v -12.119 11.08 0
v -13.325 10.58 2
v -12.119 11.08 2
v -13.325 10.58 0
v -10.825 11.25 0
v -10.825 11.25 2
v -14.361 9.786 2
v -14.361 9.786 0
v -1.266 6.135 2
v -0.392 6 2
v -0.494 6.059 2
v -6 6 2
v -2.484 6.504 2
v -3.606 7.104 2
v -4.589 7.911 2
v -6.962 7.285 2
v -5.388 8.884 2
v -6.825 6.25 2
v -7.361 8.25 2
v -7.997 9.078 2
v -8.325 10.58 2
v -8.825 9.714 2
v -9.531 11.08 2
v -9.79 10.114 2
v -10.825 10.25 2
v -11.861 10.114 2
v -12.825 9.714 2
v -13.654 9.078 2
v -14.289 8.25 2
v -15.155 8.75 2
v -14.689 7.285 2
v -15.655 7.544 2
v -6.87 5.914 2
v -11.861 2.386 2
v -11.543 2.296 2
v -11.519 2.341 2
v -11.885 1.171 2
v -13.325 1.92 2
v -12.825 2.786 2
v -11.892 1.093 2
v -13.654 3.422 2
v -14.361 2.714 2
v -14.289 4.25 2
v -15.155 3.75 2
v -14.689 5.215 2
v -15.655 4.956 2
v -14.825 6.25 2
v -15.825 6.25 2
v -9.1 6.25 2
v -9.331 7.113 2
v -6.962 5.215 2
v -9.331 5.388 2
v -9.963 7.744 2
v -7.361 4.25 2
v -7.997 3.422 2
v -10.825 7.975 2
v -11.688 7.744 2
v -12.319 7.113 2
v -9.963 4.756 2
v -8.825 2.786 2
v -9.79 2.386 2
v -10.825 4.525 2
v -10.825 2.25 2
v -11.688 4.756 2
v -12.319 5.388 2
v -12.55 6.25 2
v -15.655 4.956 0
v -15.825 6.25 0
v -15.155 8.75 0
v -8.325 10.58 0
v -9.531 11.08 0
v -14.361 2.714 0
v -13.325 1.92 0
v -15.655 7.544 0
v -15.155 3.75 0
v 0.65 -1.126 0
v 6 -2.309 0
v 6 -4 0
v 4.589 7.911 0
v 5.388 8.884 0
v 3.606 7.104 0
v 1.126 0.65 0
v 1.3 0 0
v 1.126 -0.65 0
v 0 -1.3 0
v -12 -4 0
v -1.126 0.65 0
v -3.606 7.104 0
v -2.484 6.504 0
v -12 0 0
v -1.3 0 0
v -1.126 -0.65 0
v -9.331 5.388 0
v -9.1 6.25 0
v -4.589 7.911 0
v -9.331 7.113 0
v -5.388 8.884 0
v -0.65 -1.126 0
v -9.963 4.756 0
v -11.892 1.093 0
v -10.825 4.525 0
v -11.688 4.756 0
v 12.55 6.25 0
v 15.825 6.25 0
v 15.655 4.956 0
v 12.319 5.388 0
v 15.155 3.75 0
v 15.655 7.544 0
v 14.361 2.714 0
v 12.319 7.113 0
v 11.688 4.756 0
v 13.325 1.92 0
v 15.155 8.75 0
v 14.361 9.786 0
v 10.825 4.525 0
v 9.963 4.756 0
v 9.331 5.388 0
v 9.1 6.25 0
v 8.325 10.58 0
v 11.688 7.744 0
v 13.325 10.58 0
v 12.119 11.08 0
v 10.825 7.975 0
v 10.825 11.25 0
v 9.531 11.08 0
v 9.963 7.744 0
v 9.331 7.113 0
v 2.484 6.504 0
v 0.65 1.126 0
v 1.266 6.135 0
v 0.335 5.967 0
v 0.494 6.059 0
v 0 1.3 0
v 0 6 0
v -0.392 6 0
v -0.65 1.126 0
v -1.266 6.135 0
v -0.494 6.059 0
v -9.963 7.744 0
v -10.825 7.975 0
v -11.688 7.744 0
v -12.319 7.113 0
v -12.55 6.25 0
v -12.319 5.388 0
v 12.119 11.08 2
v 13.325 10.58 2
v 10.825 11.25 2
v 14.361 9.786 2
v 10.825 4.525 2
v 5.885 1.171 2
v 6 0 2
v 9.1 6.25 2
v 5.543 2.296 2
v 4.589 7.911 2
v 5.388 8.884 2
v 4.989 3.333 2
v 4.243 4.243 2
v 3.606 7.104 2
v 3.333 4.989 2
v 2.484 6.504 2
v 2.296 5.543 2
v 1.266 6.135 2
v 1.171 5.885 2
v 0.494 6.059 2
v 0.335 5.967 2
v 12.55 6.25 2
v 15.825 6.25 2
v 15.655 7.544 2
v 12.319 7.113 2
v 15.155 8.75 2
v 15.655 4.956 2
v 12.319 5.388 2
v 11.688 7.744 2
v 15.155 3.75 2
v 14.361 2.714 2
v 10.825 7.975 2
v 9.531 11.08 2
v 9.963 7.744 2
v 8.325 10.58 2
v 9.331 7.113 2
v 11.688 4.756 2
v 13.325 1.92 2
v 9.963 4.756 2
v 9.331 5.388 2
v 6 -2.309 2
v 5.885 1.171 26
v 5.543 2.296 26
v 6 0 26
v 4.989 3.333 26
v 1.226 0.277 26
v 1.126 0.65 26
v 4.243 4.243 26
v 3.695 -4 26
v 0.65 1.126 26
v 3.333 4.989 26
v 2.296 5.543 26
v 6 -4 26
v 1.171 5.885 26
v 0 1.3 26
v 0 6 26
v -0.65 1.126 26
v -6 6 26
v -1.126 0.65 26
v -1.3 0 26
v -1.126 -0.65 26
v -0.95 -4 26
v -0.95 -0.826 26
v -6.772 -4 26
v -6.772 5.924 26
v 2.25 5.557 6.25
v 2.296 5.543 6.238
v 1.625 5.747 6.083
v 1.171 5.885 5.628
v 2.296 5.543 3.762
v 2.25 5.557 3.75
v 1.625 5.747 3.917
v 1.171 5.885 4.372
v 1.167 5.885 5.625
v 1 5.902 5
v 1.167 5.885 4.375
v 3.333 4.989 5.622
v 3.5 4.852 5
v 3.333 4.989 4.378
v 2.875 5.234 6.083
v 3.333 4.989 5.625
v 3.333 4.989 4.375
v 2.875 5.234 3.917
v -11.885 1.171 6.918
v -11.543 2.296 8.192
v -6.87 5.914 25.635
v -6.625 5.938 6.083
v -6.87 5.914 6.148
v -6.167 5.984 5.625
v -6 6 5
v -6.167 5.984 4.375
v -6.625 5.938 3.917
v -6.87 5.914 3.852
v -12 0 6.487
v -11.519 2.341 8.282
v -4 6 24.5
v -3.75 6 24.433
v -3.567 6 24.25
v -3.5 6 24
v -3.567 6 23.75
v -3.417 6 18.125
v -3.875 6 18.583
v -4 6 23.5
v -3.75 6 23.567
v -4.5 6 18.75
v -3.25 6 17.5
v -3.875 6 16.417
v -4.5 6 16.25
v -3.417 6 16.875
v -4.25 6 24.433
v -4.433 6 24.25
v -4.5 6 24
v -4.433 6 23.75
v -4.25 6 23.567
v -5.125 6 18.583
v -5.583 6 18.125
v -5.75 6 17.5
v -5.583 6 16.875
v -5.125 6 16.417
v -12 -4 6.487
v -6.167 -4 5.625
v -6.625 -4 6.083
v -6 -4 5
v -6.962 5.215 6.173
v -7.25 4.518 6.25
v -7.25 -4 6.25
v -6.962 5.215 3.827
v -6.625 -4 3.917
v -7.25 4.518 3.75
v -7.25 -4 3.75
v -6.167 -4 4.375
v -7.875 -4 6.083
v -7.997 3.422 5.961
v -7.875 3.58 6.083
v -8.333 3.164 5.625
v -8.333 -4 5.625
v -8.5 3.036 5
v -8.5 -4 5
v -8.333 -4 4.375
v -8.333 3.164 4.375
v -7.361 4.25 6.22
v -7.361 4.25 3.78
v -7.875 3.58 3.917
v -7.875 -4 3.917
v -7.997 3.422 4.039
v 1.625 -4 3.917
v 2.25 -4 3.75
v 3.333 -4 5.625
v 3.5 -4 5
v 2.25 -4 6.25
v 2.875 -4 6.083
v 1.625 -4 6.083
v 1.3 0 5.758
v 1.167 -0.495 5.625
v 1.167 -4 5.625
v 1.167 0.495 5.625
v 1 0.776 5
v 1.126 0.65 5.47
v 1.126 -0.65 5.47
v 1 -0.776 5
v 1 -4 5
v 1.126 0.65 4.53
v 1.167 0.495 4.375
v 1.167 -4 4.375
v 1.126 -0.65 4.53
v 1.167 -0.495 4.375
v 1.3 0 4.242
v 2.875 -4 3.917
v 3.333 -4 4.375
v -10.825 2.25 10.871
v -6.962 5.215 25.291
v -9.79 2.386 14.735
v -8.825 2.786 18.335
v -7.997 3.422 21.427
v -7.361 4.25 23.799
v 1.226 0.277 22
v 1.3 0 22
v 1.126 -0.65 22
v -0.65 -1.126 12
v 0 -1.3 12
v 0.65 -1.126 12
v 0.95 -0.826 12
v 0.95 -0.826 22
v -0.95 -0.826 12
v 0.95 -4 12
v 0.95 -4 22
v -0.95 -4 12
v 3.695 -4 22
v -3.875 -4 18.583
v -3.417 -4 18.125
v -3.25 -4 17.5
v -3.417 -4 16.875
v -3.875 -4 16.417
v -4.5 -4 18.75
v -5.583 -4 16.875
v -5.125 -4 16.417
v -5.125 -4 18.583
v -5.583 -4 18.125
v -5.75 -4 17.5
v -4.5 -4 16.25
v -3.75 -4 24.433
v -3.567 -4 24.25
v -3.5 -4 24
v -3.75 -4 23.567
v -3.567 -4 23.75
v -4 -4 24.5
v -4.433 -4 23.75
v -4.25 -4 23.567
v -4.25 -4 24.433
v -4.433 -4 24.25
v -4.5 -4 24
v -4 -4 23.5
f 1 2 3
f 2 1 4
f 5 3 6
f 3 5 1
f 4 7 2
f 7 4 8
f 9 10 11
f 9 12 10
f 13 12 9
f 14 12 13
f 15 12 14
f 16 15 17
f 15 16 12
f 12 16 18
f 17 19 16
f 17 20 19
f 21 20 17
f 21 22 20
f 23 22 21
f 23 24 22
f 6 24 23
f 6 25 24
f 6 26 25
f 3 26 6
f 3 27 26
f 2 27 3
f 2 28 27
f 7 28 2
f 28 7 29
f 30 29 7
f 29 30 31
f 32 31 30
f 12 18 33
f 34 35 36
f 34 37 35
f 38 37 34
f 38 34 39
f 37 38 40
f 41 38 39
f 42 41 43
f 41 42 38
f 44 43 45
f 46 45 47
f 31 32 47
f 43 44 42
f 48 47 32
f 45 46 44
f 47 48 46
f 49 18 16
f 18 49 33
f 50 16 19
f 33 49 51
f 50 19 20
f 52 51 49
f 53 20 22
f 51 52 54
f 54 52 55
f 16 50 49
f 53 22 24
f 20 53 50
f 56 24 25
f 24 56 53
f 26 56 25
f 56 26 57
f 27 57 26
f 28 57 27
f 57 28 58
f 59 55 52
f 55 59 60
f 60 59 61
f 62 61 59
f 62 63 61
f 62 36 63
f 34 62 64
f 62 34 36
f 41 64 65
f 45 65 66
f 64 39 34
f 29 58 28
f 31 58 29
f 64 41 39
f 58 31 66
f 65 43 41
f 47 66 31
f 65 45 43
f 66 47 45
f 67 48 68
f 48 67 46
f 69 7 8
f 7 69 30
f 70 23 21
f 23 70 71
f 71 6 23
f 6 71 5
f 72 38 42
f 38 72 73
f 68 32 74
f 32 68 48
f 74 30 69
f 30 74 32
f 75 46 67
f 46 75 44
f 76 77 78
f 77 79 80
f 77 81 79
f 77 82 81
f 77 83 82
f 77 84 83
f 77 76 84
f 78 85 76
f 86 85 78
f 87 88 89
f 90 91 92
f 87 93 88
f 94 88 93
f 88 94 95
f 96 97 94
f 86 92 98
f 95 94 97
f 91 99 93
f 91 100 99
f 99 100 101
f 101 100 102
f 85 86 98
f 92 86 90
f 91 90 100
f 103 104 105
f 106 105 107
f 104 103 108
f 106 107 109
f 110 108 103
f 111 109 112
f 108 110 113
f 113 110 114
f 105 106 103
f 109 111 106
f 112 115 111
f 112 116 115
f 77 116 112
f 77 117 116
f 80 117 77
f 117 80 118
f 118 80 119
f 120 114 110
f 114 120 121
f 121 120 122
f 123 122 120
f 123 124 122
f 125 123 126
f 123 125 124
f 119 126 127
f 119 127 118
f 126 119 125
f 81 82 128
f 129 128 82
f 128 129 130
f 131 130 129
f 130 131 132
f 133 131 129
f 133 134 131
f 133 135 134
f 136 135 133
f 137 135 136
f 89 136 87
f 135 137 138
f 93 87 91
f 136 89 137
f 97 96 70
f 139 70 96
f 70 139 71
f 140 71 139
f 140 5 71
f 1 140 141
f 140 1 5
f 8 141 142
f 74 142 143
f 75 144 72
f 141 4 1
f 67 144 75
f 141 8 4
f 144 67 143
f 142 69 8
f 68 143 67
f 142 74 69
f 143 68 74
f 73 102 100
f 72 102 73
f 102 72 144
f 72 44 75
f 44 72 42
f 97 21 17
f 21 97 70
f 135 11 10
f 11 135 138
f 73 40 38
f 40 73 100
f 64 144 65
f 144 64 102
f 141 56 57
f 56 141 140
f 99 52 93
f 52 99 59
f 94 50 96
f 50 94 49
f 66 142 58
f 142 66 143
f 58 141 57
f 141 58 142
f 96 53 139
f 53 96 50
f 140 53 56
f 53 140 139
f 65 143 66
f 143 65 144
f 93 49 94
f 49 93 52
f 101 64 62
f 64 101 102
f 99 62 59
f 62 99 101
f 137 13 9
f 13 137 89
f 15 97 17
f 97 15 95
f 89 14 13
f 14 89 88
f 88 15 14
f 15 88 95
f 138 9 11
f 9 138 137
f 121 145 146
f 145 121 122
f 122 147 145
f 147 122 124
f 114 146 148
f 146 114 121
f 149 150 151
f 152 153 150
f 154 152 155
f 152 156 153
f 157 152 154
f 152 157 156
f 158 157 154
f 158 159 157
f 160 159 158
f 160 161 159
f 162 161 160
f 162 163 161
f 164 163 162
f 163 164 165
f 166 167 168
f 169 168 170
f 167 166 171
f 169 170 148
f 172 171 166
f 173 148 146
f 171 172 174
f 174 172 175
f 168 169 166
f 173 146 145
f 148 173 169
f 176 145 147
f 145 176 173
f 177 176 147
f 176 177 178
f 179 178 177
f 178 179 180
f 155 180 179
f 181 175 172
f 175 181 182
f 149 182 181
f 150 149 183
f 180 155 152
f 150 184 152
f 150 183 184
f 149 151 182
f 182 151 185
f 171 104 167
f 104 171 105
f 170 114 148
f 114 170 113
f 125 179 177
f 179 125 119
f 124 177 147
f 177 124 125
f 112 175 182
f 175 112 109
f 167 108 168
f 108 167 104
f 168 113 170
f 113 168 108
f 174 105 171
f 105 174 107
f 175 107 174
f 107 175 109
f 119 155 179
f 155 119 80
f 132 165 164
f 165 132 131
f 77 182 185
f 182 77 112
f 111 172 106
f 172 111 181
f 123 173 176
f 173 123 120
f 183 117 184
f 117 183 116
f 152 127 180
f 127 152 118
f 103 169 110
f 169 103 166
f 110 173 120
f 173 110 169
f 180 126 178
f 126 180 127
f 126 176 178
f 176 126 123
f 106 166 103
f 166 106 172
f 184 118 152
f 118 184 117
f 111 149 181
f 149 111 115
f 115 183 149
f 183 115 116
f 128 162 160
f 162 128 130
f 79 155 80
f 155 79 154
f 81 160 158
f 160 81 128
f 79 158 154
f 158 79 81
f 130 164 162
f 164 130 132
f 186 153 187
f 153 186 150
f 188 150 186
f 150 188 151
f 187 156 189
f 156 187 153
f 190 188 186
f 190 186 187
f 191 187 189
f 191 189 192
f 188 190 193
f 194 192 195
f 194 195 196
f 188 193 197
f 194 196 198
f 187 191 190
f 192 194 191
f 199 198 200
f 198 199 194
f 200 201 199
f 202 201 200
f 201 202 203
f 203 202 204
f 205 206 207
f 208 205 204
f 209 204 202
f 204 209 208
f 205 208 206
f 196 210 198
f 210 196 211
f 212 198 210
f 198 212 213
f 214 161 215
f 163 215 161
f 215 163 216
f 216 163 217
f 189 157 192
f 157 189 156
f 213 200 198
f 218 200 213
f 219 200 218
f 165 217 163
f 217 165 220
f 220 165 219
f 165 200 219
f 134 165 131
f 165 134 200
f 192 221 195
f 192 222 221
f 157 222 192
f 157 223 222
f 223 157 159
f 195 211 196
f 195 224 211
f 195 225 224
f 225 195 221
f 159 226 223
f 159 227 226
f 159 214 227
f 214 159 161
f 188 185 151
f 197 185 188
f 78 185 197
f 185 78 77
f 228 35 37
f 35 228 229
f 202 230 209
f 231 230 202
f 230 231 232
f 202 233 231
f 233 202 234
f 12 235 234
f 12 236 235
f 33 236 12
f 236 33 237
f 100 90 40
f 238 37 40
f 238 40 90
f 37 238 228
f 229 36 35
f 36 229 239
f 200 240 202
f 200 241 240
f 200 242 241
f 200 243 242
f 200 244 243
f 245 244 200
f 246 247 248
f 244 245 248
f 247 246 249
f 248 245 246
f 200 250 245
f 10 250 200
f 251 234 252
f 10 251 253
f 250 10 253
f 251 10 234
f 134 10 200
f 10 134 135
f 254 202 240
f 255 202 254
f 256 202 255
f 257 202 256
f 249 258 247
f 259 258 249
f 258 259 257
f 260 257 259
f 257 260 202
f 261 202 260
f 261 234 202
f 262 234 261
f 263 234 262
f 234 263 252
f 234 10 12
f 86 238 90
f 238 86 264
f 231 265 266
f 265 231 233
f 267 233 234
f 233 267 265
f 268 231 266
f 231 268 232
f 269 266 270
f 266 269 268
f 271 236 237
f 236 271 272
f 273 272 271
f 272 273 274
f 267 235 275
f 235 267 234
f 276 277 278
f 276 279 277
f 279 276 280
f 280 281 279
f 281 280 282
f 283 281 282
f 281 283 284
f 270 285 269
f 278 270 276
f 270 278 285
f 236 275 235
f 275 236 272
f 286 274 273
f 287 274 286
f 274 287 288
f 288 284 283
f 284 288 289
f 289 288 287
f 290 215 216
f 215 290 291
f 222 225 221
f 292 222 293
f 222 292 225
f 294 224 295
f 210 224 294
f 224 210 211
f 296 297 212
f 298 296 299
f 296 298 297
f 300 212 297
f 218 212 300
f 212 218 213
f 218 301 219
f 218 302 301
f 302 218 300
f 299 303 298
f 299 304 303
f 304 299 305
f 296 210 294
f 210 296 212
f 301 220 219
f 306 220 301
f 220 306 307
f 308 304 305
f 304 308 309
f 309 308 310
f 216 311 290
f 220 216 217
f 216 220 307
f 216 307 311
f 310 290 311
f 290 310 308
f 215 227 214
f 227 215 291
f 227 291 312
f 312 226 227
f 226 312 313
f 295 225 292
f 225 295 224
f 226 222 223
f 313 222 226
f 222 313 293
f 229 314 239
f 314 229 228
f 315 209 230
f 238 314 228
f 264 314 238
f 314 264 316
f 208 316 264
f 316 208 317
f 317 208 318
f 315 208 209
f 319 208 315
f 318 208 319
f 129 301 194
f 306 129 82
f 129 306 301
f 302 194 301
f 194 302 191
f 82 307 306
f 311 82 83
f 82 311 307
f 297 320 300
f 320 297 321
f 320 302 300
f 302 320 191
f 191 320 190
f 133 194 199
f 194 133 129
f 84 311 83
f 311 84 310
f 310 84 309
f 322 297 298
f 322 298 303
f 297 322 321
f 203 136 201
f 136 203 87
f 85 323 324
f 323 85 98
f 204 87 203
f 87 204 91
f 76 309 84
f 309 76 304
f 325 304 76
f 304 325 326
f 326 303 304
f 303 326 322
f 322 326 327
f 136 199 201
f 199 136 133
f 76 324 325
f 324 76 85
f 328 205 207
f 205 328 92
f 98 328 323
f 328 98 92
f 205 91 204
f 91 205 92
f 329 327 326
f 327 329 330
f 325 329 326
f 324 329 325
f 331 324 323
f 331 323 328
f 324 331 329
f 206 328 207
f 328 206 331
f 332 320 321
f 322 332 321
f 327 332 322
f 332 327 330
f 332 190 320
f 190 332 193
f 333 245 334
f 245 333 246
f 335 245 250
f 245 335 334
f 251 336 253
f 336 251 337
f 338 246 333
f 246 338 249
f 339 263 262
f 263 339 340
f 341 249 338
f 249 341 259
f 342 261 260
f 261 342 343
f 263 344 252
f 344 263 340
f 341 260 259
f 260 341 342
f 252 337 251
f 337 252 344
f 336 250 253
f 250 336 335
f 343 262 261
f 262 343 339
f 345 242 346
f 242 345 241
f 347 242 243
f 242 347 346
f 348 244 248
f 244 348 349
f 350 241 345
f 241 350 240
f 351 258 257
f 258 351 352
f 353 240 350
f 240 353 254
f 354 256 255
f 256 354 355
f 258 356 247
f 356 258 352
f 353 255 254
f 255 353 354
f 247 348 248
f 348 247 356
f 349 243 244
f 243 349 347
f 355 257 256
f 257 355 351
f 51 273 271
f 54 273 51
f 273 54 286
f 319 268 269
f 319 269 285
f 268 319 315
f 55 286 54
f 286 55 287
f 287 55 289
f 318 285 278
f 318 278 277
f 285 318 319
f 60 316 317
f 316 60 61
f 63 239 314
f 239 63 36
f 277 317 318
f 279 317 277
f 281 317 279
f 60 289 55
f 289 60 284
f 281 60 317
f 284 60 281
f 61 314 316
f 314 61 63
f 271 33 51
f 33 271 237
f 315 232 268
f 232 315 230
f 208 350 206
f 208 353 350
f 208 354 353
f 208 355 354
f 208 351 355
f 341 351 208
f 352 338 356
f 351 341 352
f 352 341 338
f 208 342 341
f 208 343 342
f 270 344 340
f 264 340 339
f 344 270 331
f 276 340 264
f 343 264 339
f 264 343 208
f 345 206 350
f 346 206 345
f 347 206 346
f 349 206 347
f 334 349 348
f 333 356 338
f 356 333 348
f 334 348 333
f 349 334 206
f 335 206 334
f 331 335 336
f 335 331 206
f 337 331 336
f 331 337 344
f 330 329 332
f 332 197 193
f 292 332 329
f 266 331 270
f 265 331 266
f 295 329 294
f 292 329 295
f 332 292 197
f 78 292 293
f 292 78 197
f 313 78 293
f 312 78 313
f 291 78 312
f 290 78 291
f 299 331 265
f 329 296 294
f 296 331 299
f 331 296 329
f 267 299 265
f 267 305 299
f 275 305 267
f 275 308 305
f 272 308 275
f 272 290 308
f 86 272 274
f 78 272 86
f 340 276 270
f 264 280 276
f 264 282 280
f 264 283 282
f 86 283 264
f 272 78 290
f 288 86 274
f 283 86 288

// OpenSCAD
// file: microswitch.scad
// Don't print this file, purchase real micro switches
// e.g. Honeywell ZM10B10A01 or OMRON SS-5 or similar.

module microswitch() {
  difference() {
    union() {
      translate([0, 0, 2.5])
        cube([19.8, 6, 10], center=true);
      translate([2.5, 0.5, 6])
        cube([2, 3.5, 5], center=true);
      for (x = [-8, -1, 8]) {
        translate([x, 0, 0])
          cube([0.6, 3.2, 13], center=true);
      }
    }
    for (x = [-9.5/2, 9.5/2]) {
      translate([x, 0, 0]) rotate([90, 0, 0])
        cylinder(r=2.5/2, h=20, center=true, $fn=12);
    }
  }
}

microswitch();
// file: configuration.scad
// Increase this if your slicer or printer make holes too tight.
extra_radius = 0.1;

// OD = outside diameter, corner to corner.
m3_nut_od = 6.1;
m3_nut_radius = m3_nut_od/2 + 0.2 + extra_radius;
m3_washer_radius = 3.5 + extra_radius;

// Major diameter of metric 3mm thread.
m3_major = 2.85;
m3_radius = m3_major/2 + extra_radius;
m3_wide_radius = m3_major/2 + extra_radius + 0.2;

// NEMA17 stepper motors.
motor_shaft_diameter = 5;
motor_shaft_radius = motor_shaft_diameter/2 + extra_radius;

// Frame brackets. M3x8mm screws work best with 3.6 mm brackets.
thickness = 3.6;

// OpenBeam or Misumi. Currently only 15x15 mm, but there is a plan
// to make models more parametric and allow 20x20 mm in the future.
extrusion = 15;

// Placement for the NEMA17 stepper motors.
motor_offset = 44;
motor_length = 47;
// main file
include <configuration.scad>;

use <microswitch.scad>;

height = 26;
height2 = 26;
tunnel = 2.4;
face_offset = 4;

module foot() {
  difference() {
    translate([12.5, 0, 0]) rotate([0, 0, -60])
      translate([-12.5, 0, 1]) rotate([0, 0, -60]) union() {
        cylinder(r=5, h=2, center=true, $fn=24);
        translate([10, 0, 0])
          cube([20, 10, 2], center=true);
    }
    translate([0, -10, 0])
      cube([40, 20, 20], center=true);
    translate([12.5, 0, 0]) {
      // Space for bowden push fit connector.
      cylinder(r=6.49, h=3*height, center=true, $fn=32);
      for (a = [60:120:359]) {
	    rotate([0, 0, a]) translate([-12.5, 0, 0])
          cylinder(r=m3_wide_radius, h=20, center=true, $fn=12);
      }
    }
  }
}

module retractable() {
  difference() {
    union() {
      translate([0, 0, height/2])
        cylinder(r=6, h=height, center=true, $fn=32);
      translate([0, -3, height/2])
        cube([12, 6, height], center=true);
      // Lower part on the left.
      translate([-6, 0, height2/2])
        cylinder(r=6, h=height2, center=true, $fn=32);
      translate([-3, 0, height2/2])
        cube([6, 12, height2], center=true);
      translate([-3, -3, height2/2])
        cube([18, 6, height2], center=true);
      // Feet for vertical M3 screw attachment.
      rotate([0, 0, 90]) {
        foot();
        scale([1, -1, 1]) foot();
      }
    }
    translate([-19, 0, height/2+6]) rotate([0, 15, 0])
      cube([20, 20, height], center=true);
    cylinder(r=tunnel/2+extra_radius, h=3*height, center=true, $fn=12);
    translate([0, -6, height/2+12])
      cube([tunnel-0.5, 12, height], center=true);
    rotate([0, 0, 30]) translate([0, -6, height/2+22])
      cube([tunnel, 12, height], center=true);
    // Safety needle spring.
    translate([-4.5, 0, height-8.5]) rotate([90, 0, 0])
      cylinder(r=2.5/2, h=40, center=true, $fn=12);
    translate([-4, 0, height-2]) rotate([90, 0, 0])
      cylinder(r=1/2, h=40, center=true, $fn=12);
    // Effector screw heads.
    rotate([0, 0, 330]) translate([-12.5, 0, 2])
      cylinder(r=4, h=30, $fn=24);
    // Flat front face.
    translate([0, -face_offset-10, height/2]) difference() {
      cube([30, 20, 2*height], center=true);
    }
    // Sub-miniature micro switch.
    translate([-2.5, -face_offset-3, 5]) {
      % microswitch();
      for (x = [-9.5/2, 9.5/2]) {
        translate([x, 0, 0]) rotate([90, 0, 0])
          cylinder(r=2.5/2, h=40, center=true, $fn=12);
      }
    }
  }
}

retractable();
